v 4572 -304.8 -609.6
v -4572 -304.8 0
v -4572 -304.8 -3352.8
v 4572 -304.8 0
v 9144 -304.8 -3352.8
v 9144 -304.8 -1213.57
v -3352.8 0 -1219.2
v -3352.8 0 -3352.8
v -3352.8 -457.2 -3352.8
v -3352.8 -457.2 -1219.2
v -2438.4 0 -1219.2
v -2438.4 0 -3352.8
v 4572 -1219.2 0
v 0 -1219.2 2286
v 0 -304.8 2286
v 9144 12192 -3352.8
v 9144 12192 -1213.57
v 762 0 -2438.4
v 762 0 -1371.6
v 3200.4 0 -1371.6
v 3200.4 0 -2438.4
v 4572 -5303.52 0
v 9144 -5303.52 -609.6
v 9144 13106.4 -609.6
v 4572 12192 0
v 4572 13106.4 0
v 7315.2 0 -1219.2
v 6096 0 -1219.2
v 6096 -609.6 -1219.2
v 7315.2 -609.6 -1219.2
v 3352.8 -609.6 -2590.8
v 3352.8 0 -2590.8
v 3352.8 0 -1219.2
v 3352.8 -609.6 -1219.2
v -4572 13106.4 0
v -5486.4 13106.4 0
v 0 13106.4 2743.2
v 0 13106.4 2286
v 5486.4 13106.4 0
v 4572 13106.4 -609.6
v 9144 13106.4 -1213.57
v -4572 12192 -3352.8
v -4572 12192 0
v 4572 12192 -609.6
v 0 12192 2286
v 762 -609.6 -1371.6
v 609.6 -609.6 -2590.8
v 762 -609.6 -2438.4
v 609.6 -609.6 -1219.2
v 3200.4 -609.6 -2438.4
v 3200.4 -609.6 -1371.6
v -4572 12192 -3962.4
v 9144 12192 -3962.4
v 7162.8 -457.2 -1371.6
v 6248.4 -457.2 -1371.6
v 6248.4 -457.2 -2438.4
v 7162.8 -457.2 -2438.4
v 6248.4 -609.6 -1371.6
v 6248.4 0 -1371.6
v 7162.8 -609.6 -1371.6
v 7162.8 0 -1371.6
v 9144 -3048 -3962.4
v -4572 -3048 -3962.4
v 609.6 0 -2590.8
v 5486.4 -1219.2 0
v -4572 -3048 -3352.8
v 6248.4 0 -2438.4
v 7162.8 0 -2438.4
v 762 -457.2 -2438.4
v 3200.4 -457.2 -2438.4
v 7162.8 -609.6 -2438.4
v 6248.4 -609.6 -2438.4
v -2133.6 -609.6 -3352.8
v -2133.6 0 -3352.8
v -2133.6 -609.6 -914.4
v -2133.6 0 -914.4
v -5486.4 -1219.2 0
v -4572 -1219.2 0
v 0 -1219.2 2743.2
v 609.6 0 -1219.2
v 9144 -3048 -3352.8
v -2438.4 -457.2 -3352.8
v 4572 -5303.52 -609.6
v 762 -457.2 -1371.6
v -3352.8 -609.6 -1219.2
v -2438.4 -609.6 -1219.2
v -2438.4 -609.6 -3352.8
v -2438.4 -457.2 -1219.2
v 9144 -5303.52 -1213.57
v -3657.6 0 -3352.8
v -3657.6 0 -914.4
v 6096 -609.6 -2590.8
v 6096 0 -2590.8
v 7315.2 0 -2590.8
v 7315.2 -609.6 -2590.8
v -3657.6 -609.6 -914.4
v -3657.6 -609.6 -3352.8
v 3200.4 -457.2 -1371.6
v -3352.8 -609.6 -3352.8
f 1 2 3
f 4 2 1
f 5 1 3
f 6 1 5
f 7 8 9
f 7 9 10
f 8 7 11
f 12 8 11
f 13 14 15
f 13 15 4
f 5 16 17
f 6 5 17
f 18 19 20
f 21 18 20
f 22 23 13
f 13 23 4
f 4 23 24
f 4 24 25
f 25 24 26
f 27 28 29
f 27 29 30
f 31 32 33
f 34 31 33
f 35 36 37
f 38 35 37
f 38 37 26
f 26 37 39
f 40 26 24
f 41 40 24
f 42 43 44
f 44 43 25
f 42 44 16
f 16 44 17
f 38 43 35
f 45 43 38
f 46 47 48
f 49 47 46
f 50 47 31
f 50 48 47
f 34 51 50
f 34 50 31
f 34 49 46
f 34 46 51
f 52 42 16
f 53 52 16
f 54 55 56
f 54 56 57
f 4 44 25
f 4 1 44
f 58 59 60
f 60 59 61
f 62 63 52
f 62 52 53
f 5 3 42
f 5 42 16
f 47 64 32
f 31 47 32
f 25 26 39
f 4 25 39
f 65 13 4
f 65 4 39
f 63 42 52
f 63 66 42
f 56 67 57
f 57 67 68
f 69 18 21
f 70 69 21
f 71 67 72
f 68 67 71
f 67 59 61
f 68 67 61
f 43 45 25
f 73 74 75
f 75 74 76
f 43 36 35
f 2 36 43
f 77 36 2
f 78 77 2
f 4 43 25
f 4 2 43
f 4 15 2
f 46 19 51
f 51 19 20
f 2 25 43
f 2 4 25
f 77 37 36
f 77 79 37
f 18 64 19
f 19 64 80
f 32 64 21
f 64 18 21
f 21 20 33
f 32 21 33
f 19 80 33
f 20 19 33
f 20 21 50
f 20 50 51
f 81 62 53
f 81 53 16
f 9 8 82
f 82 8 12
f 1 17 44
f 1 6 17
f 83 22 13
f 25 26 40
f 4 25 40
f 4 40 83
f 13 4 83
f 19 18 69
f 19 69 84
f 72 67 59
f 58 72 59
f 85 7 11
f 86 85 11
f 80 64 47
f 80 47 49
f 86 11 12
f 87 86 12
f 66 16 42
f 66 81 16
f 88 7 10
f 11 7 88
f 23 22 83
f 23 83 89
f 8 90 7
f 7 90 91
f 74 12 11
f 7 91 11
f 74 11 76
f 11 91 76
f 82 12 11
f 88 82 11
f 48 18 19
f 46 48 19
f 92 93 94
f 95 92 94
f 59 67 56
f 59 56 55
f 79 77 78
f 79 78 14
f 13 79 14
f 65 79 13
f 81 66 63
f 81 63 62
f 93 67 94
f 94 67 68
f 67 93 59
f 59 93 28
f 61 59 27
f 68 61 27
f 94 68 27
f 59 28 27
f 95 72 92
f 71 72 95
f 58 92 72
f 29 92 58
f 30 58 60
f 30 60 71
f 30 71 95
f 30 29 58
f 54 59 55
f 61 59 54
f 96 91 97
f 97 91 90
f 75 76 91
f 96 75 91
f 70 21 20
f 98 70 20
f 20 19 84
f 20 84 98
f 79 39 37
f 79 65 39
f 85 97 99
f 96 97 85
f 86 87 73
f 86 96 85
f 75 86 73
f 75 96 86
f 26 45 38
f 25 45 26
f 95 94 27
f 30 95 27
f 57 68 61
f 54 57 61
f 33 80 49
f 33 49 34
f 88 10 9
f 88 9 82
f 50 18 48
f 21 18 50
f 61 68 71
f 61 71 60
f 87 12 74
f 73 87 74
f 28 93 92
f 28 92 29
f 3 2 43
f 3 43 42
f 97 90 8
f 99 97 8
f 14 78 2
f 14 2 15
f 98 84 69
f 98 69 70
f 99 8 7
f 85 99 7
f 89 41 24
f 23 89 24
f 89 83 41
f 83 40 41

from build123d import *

# Parameters (mm, degrees)
F1_DEPTH      = 1219.2
F1_DEPTH_BACK = 13106.4
F2_DEPTH      = 304.8
F2_DEPTH_BACK = 12192
F0_W          = 4572
F0_H          = 609.6
F3_DEPTH      = 3048
F3_DEPTH_BACK = 12192
F0_W_2        = 2743.2
F0_H_2        = 1371.6
F0_W_3        = 1219.2
F0_W_4        = 2438.4
F0_H_3        = 1066.8
F0_W_5        = 914.4
F0_H_4        = 2133.6
F4_DEPTH      = 304.8
F4_DEPTH_BACK = 12192
F5_DEPTH      = 457.2
F6_DEPTH      = 609.6
F7_DEPTH      = 4084.32
F7_DEPTH_BACK = 30.48


with BuildPart() as f1:
    # F0 (on Front) → F1 (new body, two sides)
    with BuildSketch(Plane.XZ) as f1_sk:
        Polygon((-5486.4, 0), (-4572, 0), (0, 2286), (0, 2743.2), align=None)
        Polygon((0, 2286), (4572, 0), (5486.4, 0), (0, 2743.2), align=None)
    extrude(amount=F1_DEPTH)
    extrude(f1_sk.sketch, amount=-F1_DEPTH_BACK)



with BuildPart() as f1b:
    # F0 (on Front) → F1, piece 2 (new body, two sides)
    with BuildSketch(Plane.XZ) as f1_2_sk:
        Polygon((9144, -609.6), (4572, 0), (4572, -609.6), (9144, -1213.5698795319), align=None)
    extrude(amount=F1_DEPTH)
    extrude(f1_2_sk.sketch, amount=-F1_DEPTH_BACK)


with BuildPart() as f1_1:
    add(f1.part)

    add(f1b.part)  # F2 merges F1b
    # F0 (on Front) → F2 (join, two sides)
    with BuildSketch(Plane.XZ) as f2_sk:
        Polygon((-4572, 0), (0, 0), (0, 2286), align=None)
        Polygon((0, 2286), (0, 0), (4572, 0), align=None)
    extrude(amount=F2_DEPTH)
    extrude(f2_sk.sketch, amount=-F2_DEPTH_BACK)

    # F7 (add, two sides): a face of the model
    f7_faces = [f1_1.faces().sort_by_distance(p)[0] for p in [
        (6854.4648498046, -1219.2, -607.7232931773),
    ]]
    extrude(f7_faces, amount=F7_DEPTH)
    extrude(f7_faces, amount=-F7_DEPTH_BACK)


with BuildPart() as f3:
    # F0 (on Front) → F3 (new body, two sides)
    with BuildSketch(Plane.XZ) as f3_sk:
        Polygon((-3657.6, -3352.8), (-4572, -3352.8), (-4572, -3962.4), (4572, -3962.4), (4572, -3352.8), (-2133.6, -3352.8), (-2438.4, -3352.8), (-3352.8, -3352.8), align=None)
        with Locations((6858, -3657.6)):
            Rectangle(F0_W, F0_H)
    extrude(amount=F3_DEPTH)
    extrude(f3_sk.sketch, amount=-F3_DEPTH_BACK)


with BuildPart() as f4:
    # F0 (on Front) → F4 (new body, two sides)
    with BuildSketch(Plane.XZ) as f4_sk:
        Polygon((4572, 0), (0, 0), (-4572, 0), (-4572, -3352.8), (-3657.6, -3352.8), (-3657.6, -914.4), (-2133.6, -914.4), (-2133.6, -3352.8), (4572, -3352.8), (4572, -609.6), align=None)
        with Locations((1981.2, -1905)):
            Rectangle(F0_W_2, F0_H_2, mode=Mode.SUBTRACT)
        Polygon((9144, -1213.5698795319), (4572, -609.6), (4572, -3352.8), (9144, -3352.8), align=None)
        with Locations((6705.6, -1905)):
            Rectangle(F0_W_3, F0_H_2, mode=Mode.SUBTRACT)
        with Locations((1981.2, -1905)):
            Rectangle(F0_W_2, F0_H_2)
        with Locations((1981.2, -1905)):
            Rectangle(F0_W_4, F0_H_3, mode=Mode.SUBTRACT)
        with Locations((1981.2, -1905)):
            Rectangle(F0_W_4, F0_H_3)
        with Locations((-2895.6, -2286)):
            Rectangle(F0_W_5, F0_H_4)
        Polygon((-3657.6, -914.4), (-3657.6, -3352.8), (-3352.8, -3352.8), (-3352.8, -1219.2), (-2438.4, -1219.2), (-2438.4, -3352.8), (-2133.6, -3352.8), (-2133.6, -914.4), align=None)
        with Locations((6705.6, -1905)):
            Rectangle(F0_W_3, F0_H_2)
        with Locations((6705.6, -1905)):
            Rectangle(F0_W_5, F0_H_3, mode=Mode.SUBTRACT)
        with Locations((6705.6, -1905)):
            Rectangle(F0_W_5, F0_H_3)
    extrude(amount=F4_DEPTH)
    extrude(f4_sk.sketch, amount=-F4_DEPTH_BACK)


with BuildPart() as f5:
    # F0 (on Front) → F5 (new body)
    with BuildSketch(Plane.XZ):
        with Locations((-2895.6, -2286)):
            Rectangle(F0_W_5, F0_H_4)
    extrude(amount=F5_DEPTH)


with BuildPart() as f5b:
    # F0 (on Front) → F5, piece 2 (new body)
    with BuildSketch(Plane.XZ):
        with Locations((1981.2, -1905)):
            Rectangle(F0_W_4, F0_H_3)
    extrude(amount=F5_DEPTH)


with BuildPart() as f5c:
    # F0 (on Front) → F5, piece 3 (new body)
    with BuildSketch(Plane.XZ):
        with Locations((6705.6, -1905)):
            Rectangle(F0_W_5, F0_H_3)
    extrude(amount=F5_DEPTH)


with BuildPart() as f6:
    # F0 (on Front) → F6 (new body)
    with BuildSketch(Plane.XZ):
        Polygon((-3657.6, -914.4), (-3657.6, -3352.8), (-3352.8, -3352.8), (-3352.8, -1219.2), (-2438.4, -1219.2), (-2438.4, -3352.8), (-2133.6, -3352.8), (-2133.6, -914.4), align=None)
    extrude(amount=F6_DEPTH)


with BuildPart() as f6b:
    # F0 (on Front) → F6, piece 2 (new body)
    with BuildSketch(Plane.XZ):
        with Locations((1981.2, -1905)):
            Rectangle(F0_W_2, F0_H_2)
        with Locations((1981.2, -1905)):
            Rectangle(F0_W_4, F0_H_3, mode=Mode.SUBTRACT)
    extrude(amount=F6_DEPTH)


with BuildPart() as f6c:
    # F0 (on Front) → F6, piece 3 (new body)
    with BuildSketch(Plane.XZ):
        with Locations((6705.6, -1905)):
            Rectangle(F0_W_3, F0_H_2)
        with Locations((6705.6, -1905)):
            Rectangle(F0_W_5, F0_H_3, mode=Mode.SUBTRACT)
    extrude(amount=F6_DEPTH)


solid = Compound([f1_1.part, f3.part, f4.part, f5.part, f5b.part, f5c.part, f6.part, f6b.part, f6c.part])
